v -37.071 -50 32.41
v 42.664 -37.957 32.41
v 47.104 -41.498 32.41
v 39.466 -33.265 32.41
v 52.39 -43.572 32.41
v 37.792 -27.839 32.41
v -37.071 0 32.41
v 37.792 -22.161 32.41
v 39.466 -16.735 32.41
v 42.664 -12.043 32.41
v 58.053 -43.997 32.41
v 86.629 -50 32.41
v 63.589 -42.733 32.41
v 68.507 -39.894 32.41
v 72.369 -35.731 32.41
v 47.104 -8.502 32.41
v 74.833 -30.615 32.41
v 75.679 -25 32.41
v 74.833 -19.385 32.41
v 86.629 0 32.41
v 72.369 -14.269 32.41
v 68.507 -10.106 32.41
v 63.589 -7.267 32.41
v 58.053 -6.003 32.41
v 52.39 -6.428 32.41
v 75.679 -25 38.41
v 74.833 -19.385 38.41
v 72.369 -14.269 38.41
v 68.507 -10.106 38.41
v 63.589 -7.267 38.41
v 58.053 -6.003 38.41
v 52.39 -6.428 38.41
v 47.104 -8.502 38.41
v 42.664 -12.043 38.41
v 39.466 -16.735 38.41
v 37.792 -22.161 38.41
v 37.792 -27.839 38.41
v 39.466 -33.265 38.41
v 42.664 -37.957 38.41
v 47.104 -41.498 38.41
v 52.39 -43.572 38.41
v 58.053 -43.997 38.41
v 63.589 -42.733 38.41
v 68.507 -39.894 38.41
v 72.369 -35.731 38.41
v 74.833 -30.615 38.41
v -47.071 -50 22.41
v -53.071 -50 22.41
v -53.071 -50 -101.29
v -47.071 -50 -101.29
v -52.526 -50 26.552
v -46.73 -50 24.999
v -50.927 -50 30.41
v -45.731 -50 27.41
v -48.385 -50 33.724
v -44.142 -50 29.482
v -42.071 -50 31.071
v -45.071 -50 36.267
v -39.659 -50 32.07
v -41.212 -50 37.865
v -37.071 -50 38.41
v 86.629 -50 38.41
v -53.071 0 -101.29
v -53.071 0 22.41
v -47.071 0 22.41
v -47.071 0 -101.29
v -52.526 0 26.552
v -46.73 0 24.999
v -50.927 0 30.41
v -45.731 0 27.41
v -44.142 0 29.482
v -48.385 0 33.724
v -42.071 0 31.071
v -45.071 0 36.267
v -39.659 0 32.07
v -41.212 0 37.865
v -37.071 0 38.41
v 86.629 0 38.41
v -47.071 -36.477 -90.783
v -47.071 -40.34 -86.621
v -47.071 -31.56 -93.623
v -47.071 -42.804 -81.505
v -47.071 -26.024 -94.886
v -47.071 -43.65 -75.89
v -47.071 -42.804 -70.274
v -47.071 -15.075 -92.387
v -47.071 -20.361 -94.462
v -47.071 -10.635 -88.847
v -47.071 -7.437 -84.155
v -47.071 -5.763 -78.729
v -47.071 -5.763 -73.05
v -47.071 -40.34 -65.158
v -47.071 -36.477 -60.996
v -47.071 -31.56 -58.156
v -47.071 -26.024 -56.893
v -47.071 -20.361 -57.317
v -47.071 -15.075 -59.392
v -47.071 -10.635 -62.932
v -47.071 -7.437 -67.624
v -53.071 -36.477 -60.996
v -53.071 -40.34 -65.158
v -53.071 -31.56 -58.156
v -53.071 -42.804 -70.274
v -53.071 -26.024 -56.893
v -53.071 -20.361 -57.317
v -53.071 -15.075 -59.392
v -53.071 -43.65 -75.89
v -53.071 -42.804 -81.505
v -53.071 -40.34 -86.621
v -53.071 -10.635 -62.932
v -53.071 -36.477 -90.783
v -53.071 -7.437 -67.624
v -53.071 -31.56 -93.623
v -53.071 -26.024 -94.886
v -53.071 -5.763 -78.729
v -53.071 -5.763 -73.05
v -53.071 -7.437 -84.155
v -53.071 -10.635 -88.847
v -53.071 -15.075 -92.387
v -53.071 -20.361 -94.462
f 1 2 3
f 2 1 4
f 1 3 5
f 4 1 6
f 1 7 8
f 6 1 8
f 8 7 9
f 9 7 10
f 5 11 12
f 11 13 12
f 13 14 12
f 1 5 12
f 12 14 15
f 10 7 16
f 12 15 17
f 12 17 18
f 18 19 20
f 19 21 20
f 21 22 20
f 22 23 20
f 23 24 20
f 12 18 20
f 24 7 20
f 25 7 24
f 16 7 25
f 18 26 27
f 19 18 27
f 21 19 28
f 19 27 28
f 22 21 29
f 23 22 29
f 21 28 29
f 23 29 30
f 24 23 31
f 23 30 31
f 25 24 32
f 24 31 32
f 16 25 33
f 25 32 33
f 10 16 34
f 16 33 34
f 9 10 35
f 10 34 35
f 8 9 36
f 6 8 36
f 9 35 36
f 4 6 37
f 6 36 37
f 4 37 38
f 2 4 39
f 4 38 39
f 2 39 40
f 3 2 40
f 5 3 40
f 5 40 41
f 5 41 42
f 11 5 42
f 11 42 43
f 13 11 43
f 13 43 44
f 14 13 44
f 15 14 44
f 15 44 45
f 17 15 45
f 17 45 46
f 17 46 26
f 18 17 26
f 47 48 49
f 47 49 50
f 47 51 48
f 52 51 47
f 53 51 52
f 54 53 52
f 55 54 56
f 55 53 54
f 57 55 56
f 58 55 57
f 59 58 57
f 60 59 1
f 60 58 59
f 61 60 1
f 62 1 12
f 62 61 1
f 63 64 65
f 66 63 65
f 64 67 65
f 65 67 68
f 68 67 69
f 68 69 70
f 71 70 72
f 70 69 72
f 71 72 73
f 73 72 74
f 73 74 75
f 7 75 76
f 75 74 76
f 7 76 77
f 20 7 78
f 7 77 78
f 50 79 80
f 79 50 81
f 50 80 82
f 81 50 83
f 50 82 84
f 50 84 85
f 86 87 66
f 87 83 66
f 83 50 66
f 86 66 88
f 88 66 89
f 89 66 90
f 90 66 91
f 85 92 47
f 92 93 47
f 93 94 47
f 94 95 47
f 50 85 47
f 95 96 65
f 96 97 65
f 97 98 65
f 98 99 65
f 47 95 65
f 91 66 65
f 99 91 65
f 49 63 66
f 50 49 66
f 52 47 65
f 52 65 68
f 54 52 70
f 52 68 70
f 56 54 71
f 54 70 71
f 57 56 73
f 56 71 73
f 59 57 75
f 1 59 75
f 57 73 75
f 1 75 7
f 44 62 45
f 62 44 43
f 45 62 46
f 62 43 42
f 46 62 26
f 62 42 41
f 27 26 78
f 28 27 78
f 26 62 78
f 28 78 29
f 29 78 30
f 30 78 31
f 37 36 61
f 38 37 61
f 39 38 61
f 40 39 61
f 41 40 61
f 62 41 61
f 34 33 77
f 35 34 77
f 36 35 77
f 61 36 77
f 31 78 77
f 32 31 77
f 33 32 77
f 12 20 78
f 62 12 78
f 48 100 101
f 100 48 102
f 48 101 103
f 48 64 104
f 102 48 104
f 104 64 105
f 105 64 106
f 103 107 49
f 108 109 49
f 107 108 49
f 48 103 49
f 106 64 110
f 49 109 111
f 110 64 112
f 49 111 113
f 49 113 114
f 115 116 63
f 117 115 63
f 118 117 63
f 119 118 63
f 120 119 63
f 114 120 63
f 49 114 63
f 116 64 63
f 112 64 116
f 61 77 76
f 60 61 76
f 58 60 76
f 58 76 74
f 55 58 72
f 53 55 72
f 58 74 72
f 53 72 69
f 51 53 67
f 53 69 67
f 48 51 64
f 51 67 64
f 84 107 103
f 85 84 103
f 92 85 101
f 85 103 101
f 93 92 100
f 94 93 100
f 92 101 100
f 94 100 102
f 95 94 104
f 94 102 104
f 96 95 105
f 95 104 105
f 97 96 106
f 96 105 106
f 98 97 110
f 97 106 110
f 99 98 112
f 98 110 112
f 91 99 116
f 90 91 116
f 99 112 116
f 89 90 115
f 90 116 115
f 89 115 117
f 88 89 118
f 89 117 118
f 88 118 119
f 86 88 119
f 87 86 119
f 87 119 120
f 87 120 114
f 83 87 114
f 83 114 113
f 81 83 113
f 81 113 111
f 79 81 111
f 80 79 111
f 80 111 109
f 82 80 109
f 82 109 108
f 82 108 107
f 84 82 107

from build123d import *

# Parameters (mm, degrees)
F1_DEPTH = 50
F2_R     = 19.05
F3_DEPTH = 25
F4_R     = 19.05
F5_DEPTH = 25


with BuildPart() as f1:
    # F0 (on Front) → F1 (new body)
    with BuildSketch(Plane.XZ):
        with BuildLine():
            Line((-53.070944, 22.410468), (-53.070944, -101.289532))
            Line((-53.070944, -101.289532), (-47.070944, -101.289532))
            Line((-47.070944, -101.289532), (-47.070944, 22.410468))
            ThreePointArc((-47.070944, 22.410468), (-44.142012, 29.481535), (-37.070944, 32.410468))
            Line((-37.070944, 32.410468), (86.629056, 32.410468))
            Line((86.629056, 32.410468), (86.629056, 38.410468))
            Line((86.629056, 38.410468), (-37.070944, 38.410468))
            ThreePointArc((-37.070944, 38.410468), (-48.384652, 33.724176), (-53.070944, 22.410468))
        make_face()
    extrude(amount=F1_DEPTH)

    # F2 (on face) → F3 (cut)
    with BuildSketch(Plane.XY.offset(38.410468)):
        with Locations((56.629056, -25)):
            Circle(F2_R)
    extrude(amount=-F3_DEPTH, mode=Mode.SUBTRACT)

    # F4 (on face) → F5 (cut)
    with BuildSketch(Plane(origin=(-53.070944, 0, 0), x_dir=(0, -1, 0), z_dir=(-1, 0, 0))):
        with Locations((24.6, -75.889532)):
            Circle(F4_R)
    extrude(amount=-F5_DEPTH, mode=Mode.SUBTRACT)


solid = f1.part
